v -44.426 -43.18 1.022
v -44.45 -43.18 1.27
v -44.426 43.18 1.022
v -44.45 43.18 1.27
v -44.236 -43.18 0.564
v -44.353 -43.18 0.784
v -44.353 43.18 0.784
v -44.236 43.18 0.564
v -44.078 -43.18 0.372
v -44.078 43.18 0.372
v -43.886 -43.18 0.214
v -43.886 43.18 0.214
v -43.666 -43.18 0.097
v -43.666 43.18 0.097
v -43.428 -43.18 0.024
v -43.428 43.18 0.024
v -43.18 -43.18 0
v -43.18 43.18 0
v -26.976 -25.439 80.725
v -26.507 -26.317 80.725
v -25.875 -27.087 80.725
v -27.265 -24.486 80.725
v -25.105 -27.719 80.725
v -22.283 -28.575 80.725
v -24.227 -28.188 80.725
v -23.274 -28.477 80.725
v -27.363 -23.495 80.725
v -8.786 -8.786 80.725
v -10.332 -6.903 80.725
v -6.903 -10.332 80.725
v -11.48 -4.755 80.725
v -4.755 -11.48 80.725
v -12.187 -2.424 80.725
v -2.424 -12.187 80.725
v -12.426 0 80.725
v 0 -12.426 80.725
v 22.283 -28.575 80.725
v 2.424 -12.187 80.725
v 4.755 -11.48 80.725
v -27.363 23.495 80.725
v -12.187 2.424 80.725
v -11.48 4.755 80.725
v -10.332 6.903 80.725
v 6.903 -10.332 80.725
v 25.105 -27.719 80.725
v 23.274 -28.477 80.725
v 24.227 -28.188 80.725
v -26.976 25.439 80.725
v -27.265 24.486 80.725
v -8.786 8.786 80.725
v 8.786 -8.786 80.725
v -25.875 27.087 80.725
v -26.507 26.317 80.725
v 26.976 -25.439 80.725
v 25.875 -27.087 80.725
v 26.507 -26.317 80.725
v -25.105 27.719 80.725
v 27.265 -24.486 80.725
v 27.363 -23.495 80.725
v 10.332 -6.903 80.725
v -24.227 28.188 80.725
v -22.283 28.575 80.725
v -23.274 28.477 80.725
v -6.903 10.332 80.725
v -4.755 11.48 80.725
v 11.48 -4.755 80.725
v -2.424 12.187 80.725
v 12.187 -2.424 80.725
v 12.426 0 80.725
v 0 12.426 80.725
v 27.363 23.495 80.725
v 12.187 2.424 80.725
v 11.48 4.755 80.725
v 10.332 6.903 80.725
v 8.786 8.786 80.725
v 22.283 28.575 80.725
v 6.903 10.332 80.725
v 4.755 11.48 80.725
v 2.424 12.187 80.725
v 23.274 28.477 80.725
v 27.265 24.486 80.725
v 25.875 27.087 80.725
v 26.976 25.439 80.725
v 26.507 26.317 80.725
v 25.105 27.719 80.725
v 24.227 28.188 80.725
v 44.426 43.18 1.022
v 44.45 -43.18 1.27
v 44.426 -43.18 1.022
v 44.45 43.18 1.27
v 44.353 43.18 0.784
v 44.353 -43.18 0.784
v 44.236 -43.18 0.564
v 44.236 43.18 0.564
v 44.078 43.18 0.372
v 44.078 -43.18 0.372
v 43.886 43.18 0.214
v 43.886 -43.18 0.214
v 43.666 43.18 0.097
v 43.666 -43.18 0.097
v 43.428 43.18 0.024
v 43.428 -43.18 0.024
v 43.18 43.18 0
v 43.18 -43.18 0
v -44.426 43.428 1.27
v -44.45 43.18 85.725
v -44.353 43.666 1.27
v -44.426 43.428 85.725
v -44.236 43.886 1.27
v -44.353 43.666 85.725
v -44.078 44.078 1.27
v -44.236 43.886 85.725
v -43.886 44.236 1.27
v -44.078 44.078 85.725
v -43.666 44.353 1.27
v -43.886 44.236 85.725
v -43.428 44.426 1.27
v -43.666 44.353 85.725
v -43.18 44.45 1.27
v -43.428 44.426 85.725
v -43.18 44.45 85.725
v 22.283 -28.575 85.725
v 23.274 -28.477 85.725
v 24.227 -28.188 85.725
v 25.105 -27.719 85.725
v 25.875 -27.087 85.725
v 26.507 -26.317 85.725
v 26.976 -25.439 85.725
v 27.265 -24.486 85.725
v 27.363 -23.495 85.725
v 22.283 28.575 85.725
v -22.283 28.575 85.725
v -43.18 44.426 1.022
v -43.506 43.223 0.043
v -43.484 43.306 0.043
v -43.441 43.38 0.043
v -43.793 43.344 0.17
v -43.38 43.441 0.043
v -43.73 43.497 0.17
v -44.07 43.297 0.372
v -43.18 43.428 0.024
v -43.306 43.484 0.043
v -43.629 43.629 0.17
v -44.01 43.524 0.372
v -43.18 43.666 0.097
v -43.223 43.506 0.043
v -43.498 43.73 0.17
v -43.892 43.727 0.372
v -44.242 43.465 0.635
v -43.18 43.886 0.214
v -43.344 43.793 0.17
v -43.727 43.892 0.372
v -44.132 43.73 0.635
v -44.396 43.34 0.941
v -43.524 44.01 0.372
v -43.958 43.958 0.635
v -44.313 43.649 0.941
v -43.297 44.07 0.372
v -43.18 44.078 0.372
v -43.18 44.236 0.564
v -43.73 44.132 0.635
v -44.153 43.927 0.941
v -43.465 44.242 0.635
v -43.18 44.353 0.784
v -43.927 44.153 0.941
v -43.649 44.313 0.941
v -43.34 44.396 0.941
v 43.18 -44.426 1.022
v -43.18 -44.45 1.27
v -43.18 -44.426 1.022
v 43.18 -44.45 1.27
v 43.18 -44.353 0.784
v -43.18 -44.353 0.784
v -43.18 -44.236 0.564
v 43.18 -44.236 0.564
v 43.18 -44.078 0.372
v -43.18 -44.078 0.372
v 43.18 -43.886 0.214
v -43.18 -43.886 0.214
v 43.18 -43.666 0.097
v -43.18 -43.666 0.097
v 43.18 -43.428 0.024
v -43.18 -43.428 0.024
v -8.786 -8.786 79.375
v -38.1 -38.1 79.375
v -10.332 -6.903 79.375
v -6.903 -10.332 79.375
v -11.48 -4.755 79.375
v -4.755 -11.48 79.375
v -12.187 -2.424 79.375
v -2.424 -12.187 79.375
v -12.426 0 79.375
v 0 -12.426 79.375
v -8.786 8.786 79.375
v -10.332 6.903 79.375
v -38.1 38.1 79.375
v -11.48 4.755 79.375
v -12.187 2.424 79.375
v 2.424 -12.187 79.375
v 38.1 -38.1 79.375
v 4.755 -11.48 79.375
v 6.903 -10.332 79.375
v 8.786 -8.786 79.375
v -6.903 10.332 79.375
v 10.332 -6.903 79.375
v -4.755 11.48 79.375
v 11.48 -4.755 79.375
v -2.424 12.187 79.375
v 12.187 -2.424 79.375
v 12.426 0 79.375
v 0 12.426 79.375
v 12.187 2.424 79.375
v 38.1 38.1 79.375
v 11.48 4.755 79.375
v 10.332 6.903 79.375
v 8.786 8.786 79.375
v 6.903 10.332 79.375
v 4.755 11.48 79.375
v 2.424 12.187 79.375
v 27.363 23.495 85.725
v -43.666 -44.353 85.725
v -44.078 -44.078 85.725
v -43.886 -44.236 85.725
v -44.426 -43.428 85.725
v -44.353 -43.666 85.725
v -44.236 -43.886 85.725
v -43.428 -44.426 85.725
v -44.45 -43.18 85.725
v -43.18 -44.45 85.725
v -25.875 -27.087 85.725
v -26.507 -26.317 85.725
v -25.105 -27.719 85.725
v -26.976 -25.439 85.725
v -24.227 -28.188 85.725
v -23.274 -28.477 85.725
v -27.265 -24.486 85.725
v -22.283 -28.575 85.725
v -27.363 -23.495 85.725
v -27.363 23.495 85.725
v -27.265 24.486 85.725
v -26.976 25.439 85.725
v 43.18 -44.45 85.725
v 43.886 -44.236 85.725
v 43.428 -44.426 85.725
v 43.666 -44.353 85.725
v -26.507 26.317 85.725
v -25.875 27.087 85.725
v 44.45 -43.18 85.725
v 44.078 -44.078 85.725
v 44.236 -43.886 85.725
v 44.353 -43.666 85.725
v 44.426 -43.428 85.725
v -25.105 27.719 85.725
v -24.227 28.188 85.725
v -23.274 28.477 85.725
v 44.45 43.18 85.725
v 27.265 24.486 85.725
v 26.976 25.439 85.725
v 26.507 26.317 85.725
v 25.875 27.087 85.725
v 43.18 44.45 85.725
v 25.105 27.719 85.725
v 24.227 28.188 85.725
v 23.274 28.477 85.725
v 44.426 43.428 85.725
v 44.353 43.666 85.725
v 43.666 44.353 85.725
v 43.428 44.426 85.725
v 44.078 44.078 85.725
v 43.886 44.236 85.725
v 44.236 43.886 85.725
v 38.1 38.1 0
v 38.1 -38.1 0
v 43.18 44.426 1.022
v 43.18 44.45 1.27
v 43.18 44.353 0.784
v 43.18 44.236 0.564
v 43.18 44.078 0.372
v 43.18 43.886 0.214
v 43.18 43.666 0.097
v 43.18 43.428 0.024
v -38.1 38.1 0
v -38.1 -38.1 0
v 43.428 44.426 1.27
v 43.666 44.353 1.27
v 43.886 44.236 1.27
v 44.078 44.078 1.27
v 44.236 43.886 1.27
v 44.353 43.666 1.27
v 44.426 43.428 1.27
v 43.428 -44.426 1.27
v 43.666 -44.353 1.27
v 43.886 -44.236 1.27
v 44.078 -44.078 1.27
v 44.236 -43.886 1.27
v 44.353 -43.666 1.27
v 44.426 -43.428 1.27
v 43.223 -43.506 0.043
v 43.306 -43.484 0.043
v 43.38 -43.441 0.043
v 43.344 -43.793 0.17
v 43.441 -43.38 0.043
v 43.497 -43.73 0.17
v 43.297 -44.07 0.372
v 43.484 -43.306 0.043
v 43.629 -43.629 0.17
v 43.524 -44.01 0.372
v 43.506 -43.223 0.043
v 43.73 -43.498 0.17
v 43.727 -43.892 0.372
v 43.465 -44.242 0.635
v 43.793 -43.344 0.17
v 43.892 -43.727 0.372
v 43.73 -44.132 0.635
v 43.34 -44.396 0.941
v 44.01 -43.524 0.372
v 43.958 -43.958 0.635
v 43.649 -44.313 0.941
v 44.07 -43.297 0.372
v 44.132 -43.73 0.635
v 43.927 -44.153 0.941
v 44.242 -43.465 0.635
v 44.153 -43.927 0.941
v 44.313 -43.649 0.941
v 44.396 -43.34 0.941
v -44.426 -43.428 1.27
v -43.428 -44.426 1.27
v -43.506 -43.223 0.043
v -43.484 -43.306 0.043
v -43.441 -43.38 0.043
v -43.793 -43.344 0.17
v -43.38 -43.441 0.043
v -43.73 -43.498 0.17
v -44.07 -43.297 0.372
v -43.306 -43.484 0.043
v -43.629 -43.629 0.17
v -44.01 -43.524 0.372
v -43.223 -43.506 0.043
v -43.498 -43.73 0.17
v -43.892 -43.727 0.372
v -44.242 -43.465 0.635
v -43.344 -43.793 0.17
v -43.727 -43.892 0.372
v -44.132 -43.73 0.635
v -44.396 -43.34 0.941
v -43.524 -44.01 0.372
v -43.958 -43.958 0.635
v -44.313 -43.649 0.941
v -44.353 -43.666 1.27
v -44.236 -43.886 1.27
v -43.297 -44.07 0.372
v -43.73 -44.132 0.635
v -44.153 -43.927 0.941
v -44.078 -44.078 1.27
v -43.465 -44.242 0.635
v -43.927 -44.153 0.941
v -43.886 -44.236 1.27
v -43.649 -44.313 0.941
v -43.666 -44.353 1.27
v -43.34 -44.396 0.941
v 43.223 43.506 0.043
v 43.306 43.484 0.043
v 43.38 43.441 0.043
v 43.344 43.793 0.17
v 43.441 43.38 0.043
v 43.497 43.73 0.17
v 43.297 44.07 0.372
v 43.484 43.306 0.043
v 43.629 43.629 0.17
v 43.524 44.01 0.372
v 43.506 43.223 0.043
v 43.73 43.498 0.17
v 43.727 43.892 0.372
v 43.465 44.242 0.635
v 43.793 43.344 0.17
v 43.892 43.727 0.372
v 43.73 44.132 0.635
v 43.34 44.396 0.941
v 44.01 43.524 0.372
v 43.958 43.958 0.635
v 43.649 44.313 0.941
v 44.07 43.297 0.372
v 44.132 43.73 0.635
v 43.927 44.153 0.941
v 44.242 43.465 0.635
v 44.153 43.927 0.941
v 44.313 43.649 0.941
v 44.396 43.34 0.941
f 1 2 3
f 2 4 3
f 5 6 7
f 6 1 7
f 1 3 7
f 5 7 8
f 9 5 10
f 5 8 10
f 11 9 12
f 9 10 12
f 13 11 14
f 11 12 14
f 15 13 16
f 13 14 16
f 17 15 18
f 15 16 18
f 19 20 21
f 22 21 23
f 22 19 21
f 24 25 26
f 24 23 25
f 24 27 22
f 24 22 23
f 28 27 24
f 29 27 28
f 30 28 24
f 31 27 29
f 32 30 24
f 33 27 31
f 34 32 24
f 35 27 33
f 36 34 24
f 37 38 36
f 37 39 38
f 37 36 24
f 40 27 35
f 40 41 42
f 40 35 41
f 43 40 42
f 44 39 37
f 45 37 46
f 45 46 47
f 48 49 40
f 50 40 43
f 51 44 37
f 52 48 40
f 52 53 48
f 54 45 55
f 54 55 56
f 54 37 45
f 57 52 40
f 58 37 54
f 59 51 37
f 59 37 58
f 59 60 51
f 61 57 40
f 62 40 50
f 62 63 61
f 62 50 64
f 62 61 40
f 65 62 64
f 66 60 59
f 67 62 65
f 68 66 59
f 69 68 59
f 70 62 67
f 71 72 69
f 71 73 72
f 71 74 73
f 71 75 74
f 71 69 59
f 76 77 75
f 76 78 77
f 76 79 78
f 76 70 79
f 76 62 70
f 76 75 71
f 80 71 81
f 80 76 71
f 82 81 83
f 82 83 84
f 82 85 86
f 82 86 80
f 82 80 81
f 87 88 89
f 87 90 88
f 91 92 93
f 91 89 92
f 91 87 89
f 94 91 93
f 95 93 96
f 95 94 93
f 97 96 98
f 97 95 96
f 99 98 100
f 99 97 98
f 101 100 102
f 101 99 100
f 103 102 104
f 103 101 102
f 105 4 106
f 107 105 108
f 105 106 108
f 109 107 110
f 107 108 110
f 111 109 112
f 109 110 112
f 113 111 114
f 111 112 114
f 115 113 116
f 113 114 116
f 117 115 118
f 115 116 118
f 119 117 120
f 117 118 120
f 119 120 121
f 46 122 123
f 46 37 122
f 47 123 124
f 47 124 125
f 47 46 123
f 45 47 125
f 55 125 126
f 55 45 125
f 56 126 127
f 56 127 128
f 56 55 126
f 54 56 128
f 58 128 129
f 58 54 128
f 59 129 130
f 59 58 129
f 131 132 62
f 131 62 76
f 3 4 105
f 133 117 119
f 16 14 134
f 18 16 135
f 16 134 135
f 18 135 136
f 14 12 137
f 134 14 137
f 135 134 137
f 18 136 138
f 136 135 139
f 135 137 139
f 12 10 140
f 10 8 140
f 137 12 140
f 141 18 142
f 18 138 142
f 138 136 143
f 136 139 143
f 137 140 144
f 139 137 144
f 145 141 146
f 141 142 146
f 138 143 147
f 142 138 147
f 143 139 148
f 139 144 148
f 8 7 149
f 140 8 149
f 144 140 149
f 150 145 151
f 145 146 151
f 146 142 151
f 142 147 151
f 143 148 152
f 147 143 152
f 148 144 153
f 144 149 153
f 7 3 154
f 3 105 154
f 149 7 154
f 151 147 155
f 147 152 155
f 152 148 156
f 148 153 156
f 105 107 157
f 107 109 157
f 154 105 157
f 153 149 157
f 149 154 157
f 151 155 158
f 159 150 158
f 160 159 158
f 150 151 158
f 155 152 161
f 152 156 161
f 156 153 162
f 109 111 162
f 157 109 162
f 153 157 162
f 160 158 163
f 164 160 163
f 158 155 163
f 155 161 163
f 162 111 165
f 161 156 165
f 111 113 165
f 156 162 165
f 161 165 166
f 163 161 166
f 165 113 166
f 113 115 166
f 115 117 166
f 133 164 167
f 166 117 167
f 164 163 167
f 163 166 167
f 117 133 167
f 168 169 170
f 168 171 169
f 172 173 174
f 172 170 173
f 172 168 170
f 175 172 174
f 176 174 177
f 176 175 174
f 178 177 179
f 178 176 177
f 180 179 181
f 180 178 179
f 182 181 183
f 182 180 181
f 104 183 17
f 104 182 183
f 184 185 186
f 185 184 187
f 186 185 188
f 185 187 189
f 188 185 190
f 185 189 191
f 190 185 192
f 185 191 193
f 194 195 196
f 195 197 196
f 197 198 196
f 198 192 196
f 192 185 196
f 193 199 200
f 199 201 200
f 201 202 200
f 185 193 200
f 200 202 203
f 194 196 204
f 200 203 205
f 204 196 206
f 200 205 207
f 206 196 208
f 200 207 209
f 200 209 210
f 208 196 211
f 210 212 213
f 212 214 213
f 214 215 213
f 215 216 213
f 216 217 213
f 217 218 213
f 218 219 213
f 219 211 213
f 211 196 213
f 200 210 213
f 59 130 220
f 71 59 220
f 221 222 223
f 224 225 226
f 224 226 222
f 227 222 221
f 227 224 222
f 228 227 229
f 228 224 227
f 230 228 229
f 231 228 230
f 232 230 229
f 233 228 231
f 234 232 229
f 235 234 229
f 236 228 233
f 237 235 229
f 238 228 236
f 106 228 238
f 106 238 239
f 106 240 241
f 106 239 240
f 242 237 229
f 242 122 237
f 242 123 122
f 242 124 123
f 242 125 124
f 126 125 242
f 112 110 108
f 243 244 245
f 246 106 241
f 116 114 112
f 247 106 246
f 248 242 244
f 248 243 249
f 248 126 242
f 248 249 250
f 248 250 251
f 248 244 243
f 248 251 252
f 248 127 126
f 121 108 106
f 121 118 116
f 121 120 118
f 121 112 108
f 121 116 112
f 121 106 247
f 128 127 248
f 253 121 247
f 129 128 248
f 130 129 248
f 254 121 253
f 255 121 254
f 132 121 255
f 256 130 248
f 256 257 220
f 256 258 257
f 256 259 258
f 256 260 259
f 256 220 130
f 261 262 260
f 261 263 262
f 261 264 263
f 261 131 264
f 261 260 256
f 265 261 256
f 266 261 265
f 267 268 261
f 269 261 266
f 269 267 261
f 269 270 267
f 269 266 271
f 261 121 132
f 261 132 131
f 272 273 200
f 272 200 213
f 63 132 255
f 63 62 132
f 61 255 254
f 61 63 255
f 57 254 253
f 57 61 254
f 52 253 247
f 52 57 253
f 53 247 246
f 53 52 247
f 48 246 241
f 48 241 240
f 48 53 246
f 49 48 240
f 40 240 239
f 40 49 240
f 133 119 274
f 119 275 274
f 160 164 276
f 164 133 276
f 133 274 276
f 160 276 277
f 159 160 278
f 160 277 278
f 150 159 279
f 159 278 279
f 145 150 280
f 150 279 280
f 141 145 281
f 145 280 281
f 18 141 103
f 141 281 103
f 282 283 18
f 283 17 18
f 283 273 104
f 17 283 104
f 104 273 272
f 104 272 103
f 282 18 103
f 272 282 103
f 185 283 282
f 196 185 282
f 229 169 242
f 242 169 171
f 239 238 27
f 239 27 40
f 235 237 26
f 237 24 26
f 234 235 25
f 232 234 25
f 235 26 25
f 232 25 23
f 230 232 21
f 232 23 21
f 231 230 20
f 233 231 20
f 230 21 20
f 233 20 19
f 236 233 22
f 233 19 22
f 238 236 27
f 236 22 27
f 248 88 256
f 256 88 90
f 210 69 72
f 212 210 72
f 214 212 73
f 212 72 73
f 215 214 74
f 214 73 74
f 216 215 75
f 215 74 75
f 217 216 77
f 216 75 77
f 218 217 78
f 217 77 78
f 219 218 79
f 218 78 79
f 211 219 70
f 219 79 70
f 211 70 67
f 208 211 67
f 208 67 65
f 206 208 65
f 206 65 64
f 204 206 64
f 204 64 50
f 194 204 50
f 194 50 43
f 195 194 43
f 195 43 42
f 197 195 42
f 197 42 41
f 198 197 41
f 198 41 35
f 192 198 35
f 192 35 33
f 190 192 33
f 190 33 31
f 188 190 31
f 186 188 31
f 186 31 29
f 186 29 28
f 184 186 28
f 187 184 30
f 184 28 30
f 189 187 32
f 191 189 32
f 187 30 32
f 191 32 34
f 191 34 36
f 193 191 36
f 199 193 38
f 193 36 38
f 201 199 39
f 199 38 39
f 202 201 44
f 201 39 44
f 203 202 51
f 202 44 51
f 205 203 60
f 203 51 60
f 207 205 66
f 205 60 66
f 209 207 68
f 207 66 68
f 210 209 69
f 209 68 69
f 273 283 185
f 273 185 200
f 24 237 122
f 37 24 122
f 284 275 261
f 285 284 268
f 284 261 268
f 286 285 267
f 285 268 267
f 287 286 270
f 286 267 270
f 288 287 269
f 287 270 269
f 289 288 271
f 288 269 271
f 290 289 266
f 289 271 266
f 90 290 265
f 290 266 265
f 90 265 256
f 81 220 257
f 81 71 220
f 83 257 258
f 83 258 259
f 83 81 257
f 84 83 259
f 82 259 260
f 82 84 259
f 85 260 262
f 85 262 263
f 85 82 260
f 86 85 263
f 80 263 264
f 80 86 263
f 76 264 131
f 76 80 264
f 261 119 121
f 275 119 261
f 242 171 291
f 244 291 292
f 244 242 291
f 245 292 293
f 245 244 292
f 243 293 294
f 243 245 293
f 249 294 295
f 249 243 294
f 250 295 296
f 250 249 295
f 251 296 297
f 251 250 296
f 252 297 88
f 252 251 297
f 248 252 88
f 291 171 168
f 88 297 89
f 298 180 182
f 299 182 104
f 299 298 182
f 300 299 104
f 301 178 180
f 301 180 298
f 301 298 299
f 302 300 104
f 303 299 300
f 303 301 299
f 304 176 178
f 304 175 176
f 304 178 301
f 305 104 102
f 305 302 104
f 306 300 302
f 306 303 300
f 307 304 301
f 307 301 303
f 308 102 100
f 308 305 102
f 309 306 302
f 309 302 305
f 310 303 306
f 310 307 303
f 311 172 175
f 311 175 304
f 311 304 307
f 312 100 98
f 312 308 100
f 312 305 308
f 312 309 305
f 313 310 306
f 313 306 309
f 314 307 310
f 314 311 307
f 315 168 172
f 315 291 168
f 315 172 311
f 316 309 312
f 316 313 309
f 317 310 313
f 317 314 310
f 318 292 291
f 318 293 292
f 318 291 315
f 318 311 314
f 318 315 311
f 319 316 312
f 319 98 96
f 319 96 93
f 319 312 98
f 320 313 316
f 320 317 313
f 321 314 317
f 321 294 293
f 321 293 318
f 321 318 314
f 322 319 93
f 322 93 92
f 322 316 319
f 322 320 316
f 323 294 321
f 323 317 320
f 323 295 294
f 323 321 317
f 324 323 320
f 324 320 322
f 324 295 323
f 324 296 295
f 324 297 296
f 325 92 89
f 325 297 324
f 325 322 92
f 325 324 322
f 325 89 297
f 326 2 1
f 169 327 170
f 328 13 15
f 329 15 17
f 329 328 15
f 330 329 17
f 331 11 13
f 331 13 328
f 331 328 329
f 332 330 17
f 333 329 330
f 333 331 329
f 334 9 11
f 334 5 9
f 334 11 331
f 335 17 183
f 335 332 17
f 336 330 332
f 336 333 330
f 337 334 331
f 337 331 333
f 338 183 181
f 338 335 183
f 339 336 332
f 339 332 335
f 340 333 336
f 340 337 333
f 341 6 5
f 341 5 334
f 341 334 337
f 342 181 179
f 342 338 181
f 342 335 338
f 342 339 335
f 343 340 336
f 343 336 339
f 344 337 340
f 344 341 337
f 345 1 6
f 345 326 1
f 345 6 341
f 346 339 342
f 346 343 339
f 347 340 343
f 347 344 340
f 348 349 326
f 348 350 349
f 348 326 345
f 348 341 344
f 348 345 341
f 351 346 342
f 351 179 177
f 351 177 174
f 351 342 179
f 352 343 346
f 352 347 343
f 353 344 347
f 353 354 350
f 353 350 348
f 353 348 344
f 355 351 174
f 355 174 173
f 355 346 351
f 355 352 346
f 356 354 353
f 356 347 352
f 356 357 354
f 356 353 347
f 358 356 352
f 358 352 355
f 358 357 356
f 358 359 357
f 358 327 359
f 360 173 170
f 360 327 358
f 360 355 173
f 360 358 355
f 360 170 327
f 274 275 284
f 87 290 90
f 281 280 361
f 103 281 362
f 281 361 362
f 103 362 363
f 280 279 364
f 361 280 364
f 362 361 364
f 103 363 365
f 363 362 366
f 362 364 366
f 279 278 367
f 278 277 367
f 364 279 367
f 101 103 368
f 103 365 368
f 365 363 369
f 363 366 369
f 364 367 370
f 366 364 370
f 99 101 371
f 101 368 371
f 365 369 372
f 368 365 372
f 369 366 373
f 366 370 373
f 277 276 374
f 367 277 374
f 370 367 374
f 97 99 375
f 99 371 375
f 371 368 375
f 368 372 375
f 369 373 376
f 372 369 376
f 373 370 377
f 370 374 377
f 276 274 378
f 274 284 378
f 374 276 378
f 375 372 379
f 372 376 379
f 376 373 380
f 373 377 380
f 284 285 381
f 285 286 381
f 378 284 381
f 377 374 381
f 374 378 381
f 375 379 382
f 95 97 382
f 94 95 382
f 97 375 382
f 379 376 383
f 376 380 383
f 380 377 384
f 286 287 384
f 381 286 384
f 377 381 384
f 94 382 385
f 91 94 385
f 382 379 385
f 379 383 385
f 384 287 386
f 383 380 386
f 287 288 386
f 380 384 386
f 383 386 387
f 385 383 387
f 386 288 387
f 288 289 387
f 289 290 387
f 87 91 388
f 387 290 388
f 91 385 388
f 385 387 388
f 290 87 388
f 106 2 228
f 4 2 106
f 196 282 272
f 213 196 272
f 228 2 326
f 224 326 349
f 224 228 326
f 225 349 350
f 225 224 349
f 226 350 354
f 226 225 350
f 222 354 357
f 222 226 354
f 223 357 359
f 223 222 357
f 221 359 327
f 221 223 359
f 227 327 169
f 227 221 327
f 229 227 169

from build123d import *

# Parameters (mm, degrees)
F0_W     = 88.9
F0_H     = 88.9
F1_DEPTH = 85.725
F2_T     = -6.35
F3_W     = 54.725456
F3_H     = 57.15
F4_DEPTH = 5
F5_R     = 5.08
F6_R     = 1.27
F7_R     = 12.425883
F8_DEPTH = 25.4


with BuildPart() as f1:
    # F0 (on Top) → F1 (new body)
    with BuildSketch(Plane.XY):
        Rectangle(F0_W, F0_H)
    extrude(amount=F1_DEPTH)

    # F2
    f2_openings = [f1.faces().sort_by_distance(p)[0] for p in [
        (0, 0, 0),
    ]]
    offset(amount=F2_T, openings=f2_openings)

    # F3 (on face) → F4 (cut)
    with BuildSketch(Plane.XY.offset(85.725)):
        Rectangle(F3_W, F3_H)
    extrude(amount=-F4_DEPTH, mode=Mode.SUBTRACT)

    # F5
    f5_edges = [f1.edges().sort_by_distance(p)[0] for p in [
        (-27.362728, 28.575, 83.225),
        (-27.362728, -28.575, 83.225),
        (27.362728, -28.575, 83.225),
        (27.362728, 28.575, 83.225),
    ]]
    fillet(f5_edges, radius=F5_R)

    # F6
    f6_edges = [f1.edges().sort_by_distance(p)[0] for p in [
        (44.45, -44.45, 42.8625),
        (44.45, 44.45, 42.8625),
        (-44.45, -44.45, 42.8625),
        (-44.45, 44.45, 42.8625),
        (-44.45, 0, 0),
        (0, -44.45, 0),
        (0, 44.45, 0),
        (44.45, 0, 0),
    ]]
    fillet(f6_edges, radius=F6_R)

    # F7 (on face) → F8 (cut)
    with BuildSketch(Plane.XY.offset(80.725)):
        Circle(F7_R)
    extrude(amount=-F8_DEPTH, mode=Mode.SUBTRACT)


solid = f1.part
